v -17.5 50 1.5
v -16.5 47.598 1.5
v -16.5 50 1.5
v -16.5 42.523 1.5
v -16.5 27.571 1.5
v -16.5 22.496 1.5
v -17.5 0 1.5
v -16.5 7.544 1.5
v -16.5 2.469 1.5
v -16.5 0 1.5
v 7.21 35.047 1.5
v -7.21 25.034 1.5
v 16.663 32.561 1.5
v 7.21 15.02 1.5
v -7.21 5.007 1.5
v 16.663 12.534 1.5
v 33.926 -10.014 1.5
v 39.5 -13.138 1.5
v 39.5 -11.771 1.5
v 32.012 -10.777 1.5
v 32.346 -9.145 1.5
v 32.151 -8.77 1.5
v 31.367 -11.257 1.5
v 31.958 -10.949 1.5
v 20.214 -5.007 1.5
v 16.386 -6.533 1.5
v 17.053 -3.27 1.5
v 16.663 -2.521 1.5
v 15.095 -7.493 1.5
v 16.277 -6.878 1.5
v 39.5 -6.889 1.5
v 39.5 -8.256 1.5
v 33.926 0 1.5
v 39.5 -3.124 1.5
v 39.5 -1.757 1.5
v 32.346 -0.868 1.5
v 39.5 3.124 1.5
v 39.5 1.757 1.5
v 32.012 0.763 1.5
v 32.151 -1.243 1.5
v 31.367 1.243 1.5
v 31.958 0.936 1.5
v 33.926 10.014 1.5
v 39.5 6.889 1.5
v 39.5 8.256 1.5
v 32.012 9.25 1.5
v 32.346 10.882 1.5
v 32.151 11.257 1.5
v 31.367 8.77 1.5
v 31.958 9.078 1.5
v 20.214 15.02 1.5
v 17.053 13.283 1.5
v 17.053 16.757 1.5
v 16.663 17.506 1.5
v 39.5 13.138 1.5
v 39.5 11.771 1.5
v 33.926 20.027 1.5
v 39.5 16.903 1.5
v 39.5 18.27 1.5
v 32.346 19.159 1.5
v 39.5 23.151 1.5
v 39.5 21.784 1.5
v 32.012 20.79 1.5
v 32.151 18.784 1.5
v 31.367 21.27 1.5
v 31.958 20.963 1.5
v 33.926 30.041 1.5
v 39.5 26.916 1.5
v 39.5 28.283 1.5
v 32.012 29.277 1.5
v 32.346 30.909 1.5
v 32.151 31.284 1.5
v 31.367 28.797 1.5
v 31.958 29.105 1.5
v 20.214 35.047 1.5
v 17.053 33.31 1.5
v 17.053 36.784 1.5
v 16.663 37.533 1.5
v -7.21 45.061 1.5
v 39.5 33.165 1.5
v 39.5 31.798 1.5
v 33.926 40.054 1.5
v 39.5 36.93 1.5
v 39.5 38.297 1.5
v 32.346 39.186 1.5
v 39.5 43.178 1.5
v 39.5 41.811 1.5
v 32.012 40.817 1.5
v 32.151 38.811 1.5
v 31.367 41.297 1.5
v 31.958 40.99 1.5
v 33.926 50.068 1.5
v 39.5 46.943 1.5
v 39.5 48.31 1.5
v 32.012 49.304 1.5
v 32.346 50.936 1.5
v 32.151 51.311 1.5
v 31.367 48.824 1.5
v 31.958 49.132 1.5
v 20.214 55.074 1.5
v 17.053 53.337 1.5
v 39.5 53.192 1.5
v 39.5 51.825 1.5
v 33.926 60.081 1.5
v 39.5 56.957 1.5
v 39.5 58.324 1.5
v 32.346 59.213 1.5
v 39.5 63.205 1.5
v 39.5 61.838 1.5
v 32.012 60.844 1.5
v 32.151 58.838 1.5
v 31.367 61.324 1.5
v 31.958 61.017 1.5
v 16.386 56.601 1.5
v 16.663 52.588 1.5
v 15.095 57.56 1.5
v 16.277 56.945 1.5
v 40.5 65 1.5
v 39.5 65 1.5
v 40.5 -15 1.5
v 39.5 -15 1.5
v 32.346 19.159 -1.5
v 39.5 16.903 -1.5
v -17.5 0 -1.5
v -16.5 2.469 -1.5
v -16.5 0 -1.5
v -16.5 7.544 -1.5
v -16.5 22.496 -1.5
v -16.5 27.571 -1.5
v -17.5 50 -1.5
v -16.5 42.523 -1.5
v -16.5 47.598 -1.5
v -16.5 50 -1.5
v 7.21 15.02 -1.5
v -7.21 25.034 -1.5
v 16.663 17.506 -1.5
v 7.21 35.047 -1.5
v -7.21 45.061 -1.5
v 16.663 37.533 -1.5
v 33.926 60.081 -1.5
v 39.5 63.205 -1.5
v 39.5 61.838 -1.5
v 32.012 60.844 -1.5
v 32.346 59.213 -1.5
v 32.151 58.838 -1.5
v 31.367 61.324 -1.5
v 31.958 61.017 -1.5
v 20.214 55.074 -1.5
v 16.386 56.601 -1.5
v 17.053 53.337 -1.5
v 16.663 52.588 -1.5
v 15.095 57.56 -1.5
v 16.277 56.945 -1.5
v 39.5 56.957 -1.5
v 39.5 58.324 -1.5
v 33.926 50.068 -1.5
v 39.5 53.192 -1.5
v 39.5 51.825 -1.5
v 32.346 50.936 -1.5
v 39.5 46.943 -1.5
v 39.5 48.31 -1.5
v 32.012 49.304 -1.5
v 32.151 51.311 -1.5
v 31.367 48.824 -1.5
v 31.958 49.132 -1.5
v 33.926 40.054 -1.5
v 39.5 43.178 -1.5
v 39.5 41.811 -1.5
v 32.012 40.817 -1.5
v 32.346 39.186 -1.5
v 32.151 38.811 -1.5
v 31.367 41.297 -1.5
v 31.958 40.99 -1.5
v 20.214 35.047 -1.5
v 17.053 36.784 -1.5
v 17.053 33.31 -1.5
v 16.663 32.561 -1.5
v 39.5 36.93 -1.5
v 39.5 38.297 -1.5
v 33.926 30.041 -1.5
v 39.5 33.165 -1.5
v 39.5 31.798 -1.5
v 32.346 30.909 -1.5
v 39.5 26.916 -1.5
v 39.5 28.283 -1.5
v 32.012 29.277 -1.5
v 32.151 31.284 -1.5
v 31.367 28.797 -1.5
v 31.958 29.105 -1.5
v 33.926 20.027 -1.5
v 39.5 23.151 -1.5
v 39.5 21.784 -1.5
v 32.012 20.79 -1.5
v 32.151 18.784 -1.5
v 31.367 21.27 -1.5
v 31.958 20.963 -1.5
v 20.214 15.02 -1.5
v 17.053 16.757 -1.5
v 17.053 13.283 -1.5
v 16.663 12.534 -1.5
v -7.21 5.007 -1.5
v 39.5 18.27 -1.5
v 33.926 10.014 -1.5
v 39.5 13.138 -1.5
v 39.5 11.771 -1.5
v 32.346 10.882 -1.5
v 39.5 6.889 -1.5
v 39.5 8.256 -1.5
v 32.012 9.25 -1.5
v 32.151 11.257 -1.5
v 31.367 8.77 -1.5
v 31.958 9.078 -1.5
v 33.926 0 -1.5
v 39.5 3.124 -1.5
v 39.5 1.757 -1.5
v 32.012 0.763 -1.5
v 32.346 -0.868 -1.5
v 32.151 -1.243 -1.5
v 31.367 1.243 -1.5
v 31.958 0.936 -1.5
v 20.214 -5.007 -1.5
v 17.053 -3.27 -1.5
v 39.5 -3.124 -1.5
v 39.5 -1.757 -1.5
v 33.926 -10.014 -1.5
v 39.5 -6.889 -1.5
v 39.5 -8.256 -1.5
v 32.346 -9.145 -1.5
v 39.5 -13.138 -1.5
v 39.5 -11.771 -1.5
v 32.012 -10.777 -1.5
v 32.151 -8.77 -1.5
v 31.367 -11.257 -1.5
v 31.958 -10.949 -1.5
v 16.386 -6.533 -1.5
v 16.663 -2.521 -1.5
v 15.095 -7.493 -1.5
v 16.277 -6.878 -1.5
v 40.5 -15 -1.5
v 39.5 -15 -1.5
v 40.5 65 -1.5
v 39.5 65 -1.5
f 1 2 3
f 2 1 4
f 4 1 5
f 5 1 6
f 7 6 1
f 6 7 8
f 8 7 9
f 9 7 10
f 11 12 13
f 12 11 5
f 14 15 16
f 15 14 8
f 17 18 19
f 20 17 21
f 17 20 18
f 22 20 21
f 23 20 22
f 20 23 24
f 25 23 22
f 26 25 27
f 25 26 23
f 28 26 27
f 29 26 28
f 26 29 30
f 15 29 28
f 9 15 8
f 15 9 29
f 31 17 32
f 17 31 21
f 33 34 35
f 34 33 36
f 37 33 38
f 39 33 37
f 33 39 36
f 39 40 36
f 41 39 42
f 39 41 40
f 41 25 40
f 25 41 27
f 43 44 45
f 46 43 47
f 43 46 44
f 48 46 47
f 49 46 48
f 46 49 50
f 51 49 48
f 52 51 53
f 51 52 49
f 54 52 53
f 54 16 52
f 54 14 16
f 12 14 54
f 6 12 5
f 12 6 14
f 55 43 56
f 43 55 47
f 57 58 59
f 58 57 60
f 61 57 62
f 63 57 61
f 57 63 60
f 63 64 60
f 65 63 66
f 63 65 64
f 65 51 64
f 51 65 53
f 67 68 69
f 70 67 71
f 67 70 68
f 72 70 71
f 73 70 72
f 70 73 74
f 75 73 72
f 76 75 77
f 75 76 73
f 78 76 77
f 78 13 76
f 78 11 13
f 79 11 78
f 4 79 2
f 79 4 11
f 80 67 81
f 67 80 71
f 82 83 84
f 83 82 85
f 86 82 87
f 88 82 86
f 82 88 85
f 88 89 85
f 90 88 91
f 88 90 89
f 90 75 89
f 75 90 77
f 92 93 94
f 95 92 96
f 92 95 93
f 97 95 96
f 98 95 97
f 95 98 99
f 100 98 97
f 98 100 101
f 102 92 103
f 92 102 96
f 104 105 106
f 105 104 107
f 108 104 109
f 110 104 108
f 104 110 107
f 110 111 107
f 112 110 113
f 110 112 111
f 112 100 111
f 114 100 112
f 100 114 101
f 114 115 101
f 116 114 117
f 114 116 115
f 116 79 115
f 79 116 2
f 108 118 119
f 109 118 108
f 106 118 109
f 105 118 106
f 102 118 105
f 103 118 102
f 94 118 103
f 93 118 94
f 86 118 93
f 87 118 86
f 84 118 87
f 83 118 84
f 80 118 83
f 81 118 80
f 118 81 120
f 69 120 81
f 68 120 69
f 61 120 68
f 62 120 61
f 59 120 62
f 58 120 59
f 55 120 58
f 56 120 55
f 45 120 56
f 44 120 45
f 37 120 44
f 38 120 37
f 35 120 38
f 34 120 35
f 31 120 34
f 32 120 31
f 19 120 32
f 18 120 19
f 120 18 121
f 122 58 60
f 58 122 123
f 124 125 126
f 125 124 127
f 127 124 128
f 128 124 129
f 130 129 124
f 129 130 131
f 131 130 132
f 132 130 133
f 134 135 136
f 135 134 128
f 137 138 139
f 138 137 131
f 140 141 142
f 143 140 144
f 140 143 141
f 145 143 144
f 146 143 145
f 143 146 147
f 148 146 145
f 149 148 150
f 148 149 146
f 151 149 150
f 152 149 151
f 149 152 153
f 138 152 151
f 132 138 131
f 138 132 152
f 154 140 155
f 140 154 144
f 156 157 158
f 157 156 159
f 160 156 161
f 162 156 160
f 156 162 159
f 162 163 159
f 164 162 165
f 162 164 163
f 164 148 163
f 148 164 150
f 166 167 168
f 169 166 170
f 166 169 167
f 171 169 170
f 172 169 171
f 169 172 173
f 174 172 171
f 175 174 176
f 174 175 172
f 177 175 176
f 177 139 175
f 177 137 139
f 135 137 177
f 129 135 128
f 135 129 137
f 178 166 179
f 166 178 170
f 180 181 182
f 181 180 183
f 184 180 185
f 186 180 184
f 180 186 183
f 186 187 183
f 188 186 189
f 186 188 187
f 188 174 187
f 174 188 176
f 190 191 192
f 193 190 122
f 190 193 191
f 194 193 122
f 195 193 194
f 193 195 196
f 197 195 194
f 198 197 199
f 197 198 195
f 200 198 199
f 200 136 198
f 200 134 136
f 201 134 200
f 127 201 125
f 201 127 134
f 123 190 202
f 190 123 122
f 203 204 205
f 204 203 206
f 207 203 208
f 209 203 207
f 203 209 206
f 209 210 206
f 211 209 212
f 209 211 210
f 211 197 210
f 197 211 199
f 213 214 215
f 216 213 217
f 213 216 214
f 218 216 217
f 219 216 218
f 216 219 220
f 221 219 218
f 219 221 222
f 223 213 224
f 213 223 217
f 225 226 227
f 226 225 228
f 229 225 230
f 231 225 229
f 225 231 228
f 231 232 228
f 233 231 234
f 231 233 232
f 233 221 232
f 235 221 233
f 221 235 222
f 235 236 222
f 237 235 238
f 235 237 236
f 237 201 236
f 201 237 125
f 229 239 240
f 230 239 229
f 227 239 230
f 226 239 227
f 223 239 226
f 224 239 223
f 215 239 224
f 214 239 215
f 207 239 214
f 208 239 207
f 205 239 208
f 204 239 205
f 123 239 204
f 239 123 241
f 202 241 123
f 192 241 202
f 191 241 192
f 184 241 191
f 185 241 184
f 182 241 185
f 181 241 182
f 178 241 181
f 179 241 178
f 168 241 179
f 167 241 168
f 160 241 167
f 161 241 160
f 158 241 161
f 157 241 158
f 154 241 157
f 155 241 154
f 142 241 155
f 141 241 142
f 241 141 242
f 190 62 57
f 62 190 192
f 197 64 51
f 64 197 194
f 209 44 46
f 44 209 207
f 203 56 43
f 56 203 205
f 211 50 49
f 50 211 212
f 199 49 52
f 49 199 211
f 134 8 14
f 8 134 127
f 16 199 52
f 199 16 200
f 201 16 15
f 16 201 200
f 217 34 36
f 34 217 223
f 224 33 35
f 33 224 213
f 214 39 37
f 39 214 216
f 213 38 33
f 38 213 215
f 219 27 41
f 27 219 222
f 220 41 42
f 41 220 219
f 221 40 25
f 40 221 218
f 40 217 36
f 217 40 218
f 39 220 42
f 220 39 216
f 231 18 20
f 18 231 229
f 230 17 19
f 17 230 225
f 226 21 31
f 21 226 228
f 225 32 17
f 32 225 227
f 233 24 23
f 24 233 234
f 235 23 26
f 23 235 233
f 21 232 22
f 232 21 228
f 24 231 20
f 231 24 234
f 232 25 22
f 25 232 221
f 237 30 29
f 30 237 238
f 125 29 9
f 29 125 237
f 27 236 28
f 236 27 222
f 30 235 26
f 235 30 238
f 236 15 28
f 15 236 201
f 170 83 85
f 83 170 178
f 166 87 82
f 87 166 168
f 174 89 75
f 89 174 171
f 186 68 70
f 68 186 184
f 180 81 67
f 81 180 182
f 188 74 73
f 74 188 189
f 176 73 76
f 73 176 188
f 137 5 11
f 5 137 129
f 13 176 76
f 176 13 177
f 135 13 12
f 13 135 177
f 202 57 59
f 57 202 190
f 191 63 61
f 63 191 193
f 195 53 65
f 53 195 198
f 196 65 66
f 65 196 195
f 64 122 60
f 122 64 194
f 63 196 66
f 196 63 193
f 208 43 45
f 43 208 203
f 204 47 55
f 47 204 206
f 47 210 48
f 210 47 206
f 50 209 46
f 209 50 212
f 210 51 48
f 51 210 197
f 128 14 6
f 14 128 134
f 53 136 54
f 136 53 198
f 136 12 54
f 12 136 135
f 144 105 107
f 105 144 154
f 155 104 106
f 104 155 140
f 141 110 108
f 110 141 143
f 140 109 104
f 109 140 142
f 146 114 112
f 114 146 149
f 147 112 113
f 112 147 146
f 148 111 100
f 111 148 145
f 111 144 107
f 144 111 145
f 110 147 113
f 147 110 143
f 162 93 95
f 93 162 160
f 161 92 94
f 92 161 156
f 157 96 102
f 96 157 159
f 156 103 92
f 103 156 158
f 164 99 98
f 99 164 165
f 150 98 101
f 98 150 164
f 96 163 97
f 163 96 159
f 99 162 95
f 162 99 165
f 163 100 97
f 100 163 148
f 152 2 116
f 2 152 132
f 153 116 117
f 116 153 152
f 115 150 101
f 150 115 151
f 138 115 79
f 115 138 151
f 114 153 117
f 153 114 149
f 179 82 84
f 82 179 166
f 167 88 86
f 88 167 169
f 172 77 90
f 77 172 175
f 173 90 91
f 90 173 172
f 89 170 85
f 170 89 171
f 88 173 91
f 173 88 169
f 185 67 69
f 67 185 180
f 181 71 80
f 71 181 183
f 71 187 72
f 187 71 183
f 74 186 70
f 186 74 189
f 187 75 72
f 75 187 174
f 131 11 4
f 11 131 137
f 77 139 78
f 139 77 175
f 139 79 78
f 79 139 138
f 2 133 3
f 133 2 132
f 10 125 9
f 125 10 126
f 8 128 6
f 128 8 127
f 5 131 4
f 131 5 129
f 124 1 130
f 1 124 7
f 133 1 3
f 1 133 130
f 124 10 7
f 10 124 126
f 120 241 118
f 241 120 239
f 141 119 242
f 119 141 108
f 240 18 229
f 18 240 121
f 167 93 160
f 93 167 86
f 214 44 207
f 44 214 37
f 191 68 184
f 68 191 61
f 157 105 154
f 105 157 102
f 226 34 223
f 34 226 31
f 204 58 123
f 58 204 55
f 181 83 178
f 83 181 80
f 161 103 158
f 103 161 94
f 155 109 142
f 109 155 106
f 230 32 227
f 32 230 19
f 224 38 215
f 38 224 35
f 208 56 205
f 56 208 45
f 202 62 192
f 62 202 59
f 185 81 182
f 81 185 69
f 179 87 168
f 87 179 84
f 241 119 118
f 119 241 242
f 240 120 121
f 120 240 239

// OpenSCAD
$fn = 1000;
module v(depth, angle, LScaleRatio, RScaleRatio)
{
	if (depth > 0)
	{
		union()
		{
			minkowski()
			{
				cube([100, 10, 10], center=true);
				rotate([0, 0, 45])
				cube([4, 4, 10], center=true);
				//cylinder(h=10, r=10);
			}
			translate([-50, 0 ,0])
			rotate([0, 0, angle])
			translate([50, 0, 0])
			union()
			{
				minkowski()
				{
					cube([100, 10, 10], center=true);
					//cylinder(h=10, r=10);
					rotate([0, 0, 45])
					cube([4, 4, 10], center=true);
				}
				translate([50, 0, 0])
				scale([LScaleRatio, LScaleRatio, 1])
				rotate([0, 0, -angle])
				translate([50, 0, 0])
				v(depth-1, angle, LScaleRatio, RScaleRatio);
				
			}
				translate([100, 0, 0])
				translate([-50, 0, 0])
				scale([LScaleRatio, RScaleRatio, 1])
				rotate([0, 0, 0])
				translate([50, 0, 0])
				v(depth-1, angle, LScaleRatio, RScaleRatio);
		}
	}	
}

module curvedV(depth, angle)
{
	intersection()
	{
		translate([0, 10, 45])
		rotate([0, 90, angle/2])
		cylinder(r=50, h=150, center=true);
		scale([0.5,0.5, 1])
		v(depth, angle, 0.5, 0.5);
	}
}

module repeatedV(depth, width, angle)
{
	offset = sqrt(100*100 + 100*100 - 2*100*100*cos(angle));
	for (i = [0:width])
	{
		translate([0, offset*i, 0])
		rotate([0, 0, -angle/2])
		v(depth, angle, 0.5, 0.5);
	}
}

//curvedV(4);
scale([1, 1, 0.3])
union()
{
scale([0.333, 0.333, 0.5])
	repeatedV(3, 2, 35);
	translate([-17, 25, 0])
	cube([1, 50, 10], center=true);
	translate([40, 25, 0])
	cube([1, 80, 10], center=true);
}
